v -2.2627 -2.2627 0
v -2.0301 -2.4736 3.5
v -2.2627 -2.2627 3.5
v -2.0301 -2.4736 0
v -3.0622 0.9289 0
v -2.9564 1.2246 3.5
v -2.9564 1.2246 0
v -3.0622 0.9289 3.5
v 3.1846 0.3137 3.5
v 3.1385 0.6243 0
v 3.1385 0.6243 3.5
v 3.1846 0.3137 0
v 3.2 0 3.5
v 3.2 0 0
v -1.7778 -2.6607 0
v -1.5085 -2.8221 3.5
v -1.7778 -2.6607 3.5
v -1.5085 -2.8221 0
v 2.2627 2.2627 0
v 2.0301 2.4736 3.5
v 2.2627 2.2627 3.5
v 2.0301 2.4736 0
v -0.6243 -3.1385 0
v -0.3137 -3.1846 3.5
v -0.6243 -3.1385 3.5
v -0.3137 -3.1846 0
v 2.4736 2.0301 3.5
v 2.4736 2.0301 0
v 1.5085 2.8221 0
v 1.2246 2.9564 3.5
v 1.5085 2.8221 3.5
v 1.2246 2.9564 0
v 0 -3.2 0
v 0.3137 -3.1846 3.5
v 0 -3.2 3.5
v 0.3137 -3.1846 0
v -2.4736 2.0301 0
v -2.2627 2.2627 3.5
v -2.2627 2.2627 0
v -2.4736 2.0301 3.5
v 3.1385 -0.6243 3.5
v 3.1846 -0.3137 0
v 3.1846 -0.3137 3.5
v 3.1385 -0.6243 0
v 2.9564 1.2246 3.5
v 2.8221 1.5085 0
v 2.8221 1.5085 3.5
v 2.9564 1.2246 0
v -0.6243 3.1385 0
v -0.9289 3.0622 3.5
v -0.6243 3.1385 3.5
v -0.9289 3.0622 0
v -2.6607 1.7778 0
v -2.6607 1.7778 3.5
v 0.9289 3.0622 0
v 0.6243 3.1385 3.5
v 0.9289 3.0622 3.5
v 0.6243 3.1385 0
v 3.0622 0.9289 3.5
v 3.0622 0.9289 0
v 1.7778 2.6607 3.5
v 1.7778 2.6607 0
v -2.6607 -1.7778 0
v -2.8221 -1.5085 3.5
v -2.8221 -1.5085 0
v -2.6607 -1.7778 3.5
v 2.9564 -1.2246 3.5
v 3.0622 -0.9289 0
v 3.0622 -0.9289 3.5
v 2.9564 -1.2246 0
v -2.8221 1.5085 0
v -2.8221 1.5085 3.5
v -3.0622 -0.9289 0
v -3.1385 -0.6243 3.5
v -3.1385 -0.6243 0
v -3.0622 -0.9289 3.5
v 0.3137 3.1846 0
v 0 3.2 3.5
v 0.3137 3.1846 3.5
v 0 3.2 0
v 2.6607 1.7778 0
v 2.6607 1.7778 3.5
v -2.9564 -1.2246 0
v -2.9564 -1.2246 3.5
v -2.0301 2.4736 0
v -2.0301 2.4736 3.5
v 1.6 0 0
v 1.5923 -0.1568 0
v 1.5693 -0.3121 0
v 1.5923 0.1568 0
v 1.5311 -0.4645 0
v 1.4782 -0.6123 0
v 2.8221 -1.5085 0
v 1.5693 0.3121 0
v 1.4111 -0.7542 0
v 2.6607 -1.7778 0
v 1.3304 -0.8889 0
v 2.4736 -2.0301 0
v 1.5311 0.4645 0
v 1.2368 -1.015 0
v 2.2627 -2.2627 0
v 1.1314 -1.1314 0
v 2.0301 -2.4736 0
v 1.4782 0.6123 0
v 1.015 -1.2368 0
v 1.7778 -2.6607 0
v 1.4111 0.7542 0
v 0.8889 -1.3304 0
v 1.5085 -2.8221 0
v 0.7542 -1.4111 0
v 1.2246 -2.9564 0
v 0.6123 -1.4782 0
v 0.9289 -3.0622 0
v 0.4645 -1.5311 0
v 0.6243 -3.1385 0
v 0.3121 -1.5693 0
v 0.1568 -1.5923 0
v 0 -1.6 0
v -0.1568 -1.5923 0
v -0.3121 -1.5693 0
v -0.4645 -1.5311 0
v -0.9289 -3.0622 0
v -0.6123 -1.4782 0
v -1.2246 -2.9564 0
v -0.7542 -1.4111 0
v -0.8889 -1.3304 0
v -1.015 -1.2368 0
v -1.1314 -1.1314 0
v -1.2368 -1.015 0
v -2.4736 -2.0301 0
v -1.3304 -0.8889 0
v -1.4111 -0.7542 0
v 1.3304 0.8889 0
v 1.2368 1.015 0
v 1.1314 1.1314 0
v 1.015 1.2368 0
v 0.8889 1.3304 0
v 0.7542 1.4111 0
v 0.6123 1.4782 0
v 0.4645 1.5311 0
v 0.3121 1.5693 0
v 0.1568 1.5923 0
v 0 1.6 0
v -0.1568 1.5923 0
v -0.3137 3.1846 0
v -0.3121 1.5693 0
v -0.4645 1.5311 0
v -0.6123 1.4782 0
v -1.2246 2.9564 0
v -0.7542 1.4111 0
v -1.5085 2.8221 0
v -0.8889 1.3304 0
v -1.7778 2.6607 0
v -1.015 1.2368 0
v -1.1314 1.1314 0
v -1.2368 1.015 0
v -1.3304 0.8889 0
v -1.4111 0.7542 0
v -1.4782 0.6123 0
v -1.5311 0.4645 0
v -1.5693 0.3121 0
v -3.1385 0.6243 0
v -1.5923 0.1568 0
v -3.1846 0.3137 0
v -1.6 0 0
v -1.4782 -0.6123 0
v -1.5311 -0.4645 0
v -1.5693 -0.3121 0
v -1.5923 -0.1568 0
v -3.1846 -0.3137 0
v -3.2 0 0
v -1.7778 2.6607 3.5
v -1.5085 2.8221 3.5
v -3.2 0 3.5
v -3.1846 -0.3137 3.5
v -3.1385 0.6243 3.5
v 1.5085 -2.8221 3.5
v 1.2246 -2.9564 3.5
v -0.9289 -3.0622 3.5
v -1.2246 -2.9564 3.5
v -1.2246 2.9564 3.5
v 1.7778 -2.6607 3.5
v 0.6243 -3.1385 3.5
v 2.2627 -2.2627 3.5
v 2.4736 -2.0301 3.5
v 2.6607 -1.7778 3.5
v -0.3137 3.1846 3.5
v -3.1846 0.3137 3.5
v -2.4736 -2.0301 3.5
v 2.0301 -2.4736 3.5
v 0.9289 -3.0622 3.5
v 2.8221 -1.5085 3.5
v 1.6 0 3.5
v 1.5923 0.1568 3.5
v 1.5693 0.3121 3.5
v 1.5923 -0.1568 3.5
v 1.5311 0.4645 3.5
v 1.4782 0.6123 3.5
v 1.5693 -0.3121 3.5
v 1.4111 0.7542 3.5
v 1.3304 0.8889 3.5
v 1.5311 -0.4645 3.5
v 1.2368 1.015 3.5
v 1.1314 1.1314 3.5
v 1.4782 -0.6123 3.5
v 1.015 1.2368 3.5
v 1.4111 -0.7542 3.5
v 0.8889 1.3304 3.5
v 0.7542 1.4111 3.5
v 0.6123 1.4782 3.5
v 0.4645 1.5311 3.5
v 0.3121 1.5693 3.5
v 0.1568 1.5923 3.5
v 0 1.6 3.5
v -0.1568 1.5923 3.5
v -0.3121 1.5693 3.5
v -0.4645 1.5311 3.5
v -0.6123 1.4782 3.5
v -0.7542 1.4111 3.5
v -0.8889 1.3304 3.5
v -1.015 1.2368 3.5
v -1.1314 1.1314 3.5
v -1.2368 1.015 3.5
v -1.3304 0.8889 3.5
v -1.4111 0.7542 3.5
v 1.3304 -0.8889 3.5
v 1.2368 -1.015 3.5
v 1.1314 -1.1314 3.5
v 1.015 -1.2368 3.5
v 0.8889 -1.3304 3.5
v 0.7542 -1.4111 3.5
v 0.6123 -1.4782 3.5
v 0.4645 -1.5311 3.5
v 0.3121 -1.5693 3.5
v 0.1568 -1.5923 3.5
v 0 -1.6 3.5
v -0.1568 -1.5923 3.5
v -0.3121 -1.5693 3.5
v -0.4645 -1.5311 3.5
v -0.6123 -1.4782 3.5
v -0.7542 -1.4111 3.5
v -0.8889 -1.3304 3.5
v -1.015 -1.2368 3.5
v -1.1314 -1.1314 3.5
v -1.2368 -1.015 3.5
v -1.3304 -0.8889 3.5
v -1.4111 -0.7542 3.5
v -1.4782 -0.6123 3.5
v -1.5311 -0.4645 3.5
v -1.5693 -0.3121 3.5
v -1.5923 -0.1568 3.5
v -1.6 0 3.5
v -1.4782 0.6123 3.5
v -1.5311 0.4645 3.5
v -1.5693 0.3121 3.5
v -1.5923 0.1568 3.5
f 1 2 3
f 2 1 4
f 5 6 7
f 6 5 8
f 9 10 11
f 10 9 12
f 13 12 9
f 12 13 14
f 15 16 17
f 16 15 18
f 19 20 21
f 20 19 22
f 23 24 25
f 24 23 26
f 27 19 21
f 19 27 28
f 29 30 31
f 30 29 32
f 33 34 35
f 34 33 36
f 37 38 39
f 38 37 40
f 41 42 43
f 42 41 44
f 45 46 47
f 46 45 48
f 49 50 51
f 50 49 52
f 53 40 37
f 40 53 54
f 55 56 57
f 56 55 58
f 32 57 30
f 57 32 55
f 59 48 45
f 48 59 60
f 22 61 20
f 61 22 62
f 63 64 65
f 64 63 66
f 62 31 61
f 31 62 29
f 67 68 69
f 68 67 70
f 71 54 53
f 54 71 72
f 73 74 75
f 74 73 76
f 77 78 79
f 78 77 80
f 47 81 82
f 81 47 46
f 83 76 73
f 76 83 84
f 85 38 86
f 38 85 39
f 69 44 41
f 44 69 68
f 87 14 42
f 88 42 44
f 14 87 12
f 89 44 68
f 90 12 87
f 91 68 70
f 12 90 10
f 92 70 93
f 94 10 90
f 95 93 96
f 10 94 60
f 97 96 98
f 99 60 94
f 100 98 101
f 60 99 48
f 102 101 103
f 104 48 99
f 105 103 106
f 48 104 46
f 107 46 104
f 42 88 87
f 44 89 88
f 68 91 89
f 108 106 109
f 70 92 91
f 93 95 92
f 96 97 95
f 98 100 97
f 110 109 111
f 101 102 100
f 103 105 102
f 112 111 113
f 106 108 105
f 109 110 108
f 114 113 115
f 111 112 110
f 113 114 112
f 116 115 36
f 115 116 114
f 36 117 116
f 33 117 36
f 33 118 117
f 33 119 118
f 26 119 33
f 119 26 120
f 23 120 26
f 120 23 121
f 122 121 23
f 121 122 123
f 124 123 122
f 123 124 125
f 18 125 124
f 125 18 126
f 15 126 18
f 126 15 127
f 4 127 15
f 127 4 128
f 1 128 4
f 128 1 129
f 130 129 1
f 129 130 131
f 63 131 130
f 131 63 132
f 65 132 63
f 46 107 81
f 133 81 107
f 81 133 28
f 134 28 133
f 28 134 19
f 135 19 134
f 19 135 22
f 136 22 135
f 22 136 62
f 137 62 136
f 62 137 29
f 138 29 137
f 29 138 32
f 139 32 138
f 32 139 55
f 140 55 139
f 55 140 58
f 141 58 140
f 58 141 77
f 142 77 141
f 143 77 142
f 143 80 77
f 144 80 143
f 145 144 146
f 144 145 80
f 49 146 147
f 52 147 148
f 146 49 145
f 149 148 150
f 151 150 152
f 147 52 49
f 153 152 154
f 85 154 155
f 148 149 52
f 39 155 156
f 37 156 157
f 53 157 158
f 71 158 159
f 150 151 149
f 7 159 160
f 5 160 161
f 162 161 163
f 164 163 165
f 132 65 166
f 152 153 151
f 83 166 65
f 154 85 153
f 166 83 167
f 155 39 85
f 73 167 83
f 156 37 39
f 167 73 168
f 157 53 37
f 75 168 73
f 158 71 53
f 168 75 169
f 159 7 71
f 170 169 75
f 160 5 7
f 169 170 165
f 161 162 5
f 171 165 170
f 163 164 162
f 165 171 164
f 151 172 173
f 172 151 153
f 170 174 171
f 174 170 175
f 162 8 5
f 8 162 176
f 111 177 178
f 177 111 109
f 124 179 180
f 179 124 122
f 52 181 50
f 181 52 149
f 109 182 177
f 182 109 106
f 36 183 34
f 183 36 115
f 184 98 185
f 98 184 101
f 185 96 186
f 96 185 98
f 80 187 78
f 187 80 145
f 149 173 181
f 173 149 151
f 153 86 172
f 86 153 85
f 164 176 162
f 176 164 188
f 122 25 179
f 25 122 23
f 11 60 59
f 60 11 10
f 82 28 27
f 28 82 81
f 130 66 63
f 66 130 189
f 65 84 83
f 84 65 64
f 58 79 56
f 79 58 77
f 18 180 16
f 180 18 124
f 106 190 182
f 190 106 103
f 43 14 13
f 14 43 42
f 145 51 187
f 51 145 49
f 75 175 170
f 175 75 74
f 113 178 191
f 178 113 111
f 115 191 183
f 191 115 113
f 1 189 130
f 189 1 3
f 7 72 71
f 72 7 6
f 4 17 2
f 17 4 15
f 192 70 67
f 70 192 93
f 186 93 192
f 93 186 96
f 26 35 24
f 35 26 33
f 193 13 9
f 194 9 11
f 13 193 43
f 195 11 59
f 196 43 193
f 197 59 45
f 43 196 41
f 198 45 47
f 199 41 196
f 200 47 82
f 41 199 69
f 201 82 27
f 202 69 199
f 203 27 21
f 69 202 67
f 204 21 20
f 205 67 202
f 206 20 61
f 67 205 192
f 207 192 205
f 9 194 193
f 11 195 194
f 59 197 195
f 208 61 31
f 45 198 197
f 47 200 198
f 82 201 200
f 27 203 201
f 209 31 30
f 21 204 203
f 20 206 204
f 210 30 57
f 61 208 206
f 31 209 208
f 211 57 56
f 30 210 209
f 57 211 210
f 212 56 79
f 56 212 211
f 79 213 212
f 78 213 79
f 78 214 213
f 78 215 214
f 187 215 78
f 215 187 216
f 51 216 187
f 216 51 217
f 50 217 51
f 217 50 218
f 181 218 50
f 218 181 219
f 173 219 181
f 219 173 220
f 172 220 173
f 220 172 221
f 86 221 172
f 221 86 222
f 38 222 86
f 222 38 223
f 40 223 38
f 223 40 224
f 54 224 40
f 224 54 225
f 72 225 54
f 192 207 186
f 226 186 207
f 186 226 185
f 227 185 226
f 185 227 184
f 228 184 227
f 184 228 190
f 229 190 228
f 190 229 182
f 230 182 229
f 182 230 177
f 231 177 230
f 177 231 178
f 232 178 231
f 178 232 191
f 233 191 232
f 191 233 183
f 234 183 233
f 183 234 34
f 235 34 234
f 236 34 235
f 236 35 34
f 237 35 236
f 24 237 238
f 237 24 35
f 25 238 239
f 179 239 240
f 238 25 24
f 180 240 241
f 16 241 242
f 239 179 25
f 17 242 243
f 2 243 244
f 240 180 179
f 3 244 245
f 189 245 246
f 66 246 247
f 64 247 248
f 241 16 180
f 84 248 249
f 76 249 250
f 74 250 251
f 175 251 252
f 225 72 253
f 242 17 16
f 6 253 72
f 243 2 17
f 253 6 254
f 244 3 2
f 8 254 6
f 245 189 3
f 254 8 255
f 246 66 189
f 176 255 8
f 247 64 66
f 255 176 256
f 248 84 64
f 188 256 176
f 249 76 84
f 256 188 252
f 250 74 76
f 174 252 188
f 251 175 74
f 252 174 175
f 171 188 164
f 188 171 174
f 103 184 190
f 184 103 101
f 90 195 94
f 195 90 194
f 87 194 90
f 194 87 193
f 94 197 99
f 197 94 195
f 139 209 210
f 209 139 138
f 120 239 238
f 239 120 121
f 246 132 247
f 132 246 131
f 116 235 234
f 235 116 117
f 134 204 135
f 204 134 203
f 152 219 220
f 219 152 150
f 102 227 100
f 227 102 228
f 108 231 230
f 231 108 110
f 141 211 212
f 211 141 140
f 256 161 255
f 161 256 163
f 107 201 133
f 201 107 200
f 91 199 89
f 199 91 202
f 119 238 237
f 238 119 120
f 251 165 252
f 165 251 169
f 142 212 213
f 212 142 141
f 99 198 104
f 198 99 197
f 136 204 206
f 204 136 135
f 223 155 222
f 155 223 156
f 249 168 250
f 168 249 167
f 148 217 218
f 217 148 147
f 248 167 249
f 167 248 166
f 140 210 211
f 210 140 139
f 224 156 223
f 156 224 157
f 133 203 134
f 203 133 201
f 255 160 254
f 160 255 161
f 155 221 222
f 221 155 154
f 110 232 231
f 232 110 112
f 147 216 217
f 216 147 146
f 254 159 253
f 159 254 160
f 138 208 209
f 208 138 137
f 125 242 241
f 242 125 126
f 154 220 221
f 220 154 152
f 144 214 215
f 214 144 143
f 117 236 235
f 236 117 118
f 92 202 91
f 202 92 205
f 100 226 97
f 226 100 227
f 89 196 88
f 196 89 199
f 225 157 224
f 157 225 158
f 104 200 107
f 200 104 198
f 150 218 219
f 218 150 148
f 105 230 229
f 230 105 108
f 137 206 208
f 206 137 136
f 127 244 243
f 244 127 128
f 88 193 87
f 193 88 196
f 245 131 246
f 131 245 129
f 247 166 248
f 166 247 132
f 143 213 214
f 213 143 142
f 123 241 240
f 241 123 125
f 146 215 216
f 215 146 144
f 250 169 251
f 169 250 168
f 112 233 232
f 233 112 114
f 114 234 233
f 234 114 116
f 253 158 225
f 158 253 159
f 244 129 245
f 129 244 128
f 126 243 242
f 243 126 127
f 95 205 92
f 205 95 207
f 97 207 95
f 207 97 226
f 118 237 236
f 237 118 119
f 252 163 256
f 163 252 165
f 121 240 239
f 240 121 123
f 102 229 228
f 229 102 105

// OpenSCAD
// file: common.scad
include <constants.scad>

module hole_with_delta(point, x, y) {
    key_delta = MX_KEY_SIZE / 2 + KEYDIFF + M3_HOLE_DIAM / 2;
    translate([points[point][1], points[point][2]])
    rotate([0, 0, points[point][0]])
    translate([x * key_delta, y * key_delta, 0])
    children();
}


module place_equidistant_along_line(p1, p2, n, ends=true) {
    x = p1[0] - p2[0];
    y = p1[1] - p2[1];
    theta = atan2(x, y);
    echo(theta);
    r = sqrt(pow(x, 2) + pow(y, 2));
    range = ends ? [0:n] : [1:n-1];
    for (i = range) {
        dx = sin(theta) * i / n * r;
        dy = cos(theta) * i / n * r;
        translate([p1[0] - dx, p1[1] - dy, 0])
        children();
    }
}


function get_offset(point, x, y) = [
    sin(45 - x * y * point[0]) * MX_KEY_SIZE / 2 * x + point[1],
    cos(45 - x * y * point[0]) * MX_KEY_SIZE / 2 * y + point[2],
];

module screw_holes(h) {
    key_delta = MX_KEY_SIZE / 2 + KEYDIFF + M3_HOLE_DIAM / 2;
    linear_extrude(h) {
        translate([
            points[5][1] + MX_KEY_SIZE / 2 - KEYDIFF - M3_HOLE_DIAM / 2,
            points[5][2] + key_delta,
        ])
        children();

        translate([
            points[11][1] - MX_KEY_SIZE / 2 + KEYDIFF + M3_HOLE_DIAM / 2, 
            points[11][2] + key_delta,
        ])
        children();

        translate([-1.4, 1, 0])
        translate([M3_HOLE_DIAM / 2 * sqrt(2), -M3_HOLE_DIAM / 2 * sqrt(2), 0])

        hole_with_delta(14, -1, 1)
        children();
        // hole_with_delta(11, 1, 0);
        hole_with_delta(2, -1, 0)
        children();
        // translate([M3_HOLE_DIAM / 2 * sqrt(2), M3_HOLE_DIAM / 2 * sqrt(2), 0])

        p1 = get_offset(points[12], 1, -1);
        p2 = get_offset(points[15], -1, -1);
        translate([0, 1, 0])
        place_equidistant_along_line(p1, p2, 5, ends=false)
        children();
    }
}

module strut_positions(h) {
    key_delta = MX_KEY_SIZE / 2 + KEYDIFF + M3_HOLE_DIAM / 2;
    linear_extrude(h) {
        translate([-1,3,0])
        translate([
            points[5][1] + MX_KEY_SIZE / 2 - KEYDIFF - M3_HOLE_DIAM / 2,
            points[5][2] + key_delta,
        ])
        children();

        translate([1,2.5,0])
        translate([
            points[11][1] - MX_KEY_SIZE / 2 + KEYDIFF + M3_HOLE_DIAM / 2, 
            points[11][2] + key_delta,
        ])
        children();

        translate([-0.5, 1.5, 0])
        translate([M3_HOLE_DIAM / 2 * sqrt(2), -M3_HOLE_DIAM / 2 * sqrt(2), 0])

        translate([1,2,0])
        hole_with_delta(14, -1, 1)
        children();
        // hole_with_delta(11, 1, 0);
        translate([-2.5, 2.5, 0])
        hole_with_delta(2, -1, 0)
        children();
        // translate([M3_HOLE_DIAM / 2 * sqrt(2), M3_HOLE_DIAM / 2 * sqrt(2), 0])

        p1 = get_offset(points[12], 1, -1);
        p2 = get_offset(points[15], -1, -1);
        translate([1.5, -2.5, 0])
        place_equidistant_along_line(p1, p2, 5, ends=false)
        children();
    }
}
// file: constants.scad
MX_KEY_SIZE = 19.00;
MX_HOLE_SIZE = 14.5;
MX_PLATE_THICKNESS = 1.5;
USBC_FP_H = 8.93;
USBC_FP_W = 8.40;
JMPR_H = 15.24;
JMPR_W = 5.085;
M3_HOLE_DIAM = 3.2;
M3_HEAD_DIAM = 6.0;
KB2040_SW = 2.8;
KB2040_SH = 37;
KB2040_H = 33.02;
KB2040_W = 17.78;
// main file
include <constants.scad>
include <common.scad>


difference() {
    cylinder(h=3.5, r=M3_HOLE_DIAM, $fn=64);
    cylinder(h=3.5, r=M3_HOLE_DIAM/2, $fn=64);
}
